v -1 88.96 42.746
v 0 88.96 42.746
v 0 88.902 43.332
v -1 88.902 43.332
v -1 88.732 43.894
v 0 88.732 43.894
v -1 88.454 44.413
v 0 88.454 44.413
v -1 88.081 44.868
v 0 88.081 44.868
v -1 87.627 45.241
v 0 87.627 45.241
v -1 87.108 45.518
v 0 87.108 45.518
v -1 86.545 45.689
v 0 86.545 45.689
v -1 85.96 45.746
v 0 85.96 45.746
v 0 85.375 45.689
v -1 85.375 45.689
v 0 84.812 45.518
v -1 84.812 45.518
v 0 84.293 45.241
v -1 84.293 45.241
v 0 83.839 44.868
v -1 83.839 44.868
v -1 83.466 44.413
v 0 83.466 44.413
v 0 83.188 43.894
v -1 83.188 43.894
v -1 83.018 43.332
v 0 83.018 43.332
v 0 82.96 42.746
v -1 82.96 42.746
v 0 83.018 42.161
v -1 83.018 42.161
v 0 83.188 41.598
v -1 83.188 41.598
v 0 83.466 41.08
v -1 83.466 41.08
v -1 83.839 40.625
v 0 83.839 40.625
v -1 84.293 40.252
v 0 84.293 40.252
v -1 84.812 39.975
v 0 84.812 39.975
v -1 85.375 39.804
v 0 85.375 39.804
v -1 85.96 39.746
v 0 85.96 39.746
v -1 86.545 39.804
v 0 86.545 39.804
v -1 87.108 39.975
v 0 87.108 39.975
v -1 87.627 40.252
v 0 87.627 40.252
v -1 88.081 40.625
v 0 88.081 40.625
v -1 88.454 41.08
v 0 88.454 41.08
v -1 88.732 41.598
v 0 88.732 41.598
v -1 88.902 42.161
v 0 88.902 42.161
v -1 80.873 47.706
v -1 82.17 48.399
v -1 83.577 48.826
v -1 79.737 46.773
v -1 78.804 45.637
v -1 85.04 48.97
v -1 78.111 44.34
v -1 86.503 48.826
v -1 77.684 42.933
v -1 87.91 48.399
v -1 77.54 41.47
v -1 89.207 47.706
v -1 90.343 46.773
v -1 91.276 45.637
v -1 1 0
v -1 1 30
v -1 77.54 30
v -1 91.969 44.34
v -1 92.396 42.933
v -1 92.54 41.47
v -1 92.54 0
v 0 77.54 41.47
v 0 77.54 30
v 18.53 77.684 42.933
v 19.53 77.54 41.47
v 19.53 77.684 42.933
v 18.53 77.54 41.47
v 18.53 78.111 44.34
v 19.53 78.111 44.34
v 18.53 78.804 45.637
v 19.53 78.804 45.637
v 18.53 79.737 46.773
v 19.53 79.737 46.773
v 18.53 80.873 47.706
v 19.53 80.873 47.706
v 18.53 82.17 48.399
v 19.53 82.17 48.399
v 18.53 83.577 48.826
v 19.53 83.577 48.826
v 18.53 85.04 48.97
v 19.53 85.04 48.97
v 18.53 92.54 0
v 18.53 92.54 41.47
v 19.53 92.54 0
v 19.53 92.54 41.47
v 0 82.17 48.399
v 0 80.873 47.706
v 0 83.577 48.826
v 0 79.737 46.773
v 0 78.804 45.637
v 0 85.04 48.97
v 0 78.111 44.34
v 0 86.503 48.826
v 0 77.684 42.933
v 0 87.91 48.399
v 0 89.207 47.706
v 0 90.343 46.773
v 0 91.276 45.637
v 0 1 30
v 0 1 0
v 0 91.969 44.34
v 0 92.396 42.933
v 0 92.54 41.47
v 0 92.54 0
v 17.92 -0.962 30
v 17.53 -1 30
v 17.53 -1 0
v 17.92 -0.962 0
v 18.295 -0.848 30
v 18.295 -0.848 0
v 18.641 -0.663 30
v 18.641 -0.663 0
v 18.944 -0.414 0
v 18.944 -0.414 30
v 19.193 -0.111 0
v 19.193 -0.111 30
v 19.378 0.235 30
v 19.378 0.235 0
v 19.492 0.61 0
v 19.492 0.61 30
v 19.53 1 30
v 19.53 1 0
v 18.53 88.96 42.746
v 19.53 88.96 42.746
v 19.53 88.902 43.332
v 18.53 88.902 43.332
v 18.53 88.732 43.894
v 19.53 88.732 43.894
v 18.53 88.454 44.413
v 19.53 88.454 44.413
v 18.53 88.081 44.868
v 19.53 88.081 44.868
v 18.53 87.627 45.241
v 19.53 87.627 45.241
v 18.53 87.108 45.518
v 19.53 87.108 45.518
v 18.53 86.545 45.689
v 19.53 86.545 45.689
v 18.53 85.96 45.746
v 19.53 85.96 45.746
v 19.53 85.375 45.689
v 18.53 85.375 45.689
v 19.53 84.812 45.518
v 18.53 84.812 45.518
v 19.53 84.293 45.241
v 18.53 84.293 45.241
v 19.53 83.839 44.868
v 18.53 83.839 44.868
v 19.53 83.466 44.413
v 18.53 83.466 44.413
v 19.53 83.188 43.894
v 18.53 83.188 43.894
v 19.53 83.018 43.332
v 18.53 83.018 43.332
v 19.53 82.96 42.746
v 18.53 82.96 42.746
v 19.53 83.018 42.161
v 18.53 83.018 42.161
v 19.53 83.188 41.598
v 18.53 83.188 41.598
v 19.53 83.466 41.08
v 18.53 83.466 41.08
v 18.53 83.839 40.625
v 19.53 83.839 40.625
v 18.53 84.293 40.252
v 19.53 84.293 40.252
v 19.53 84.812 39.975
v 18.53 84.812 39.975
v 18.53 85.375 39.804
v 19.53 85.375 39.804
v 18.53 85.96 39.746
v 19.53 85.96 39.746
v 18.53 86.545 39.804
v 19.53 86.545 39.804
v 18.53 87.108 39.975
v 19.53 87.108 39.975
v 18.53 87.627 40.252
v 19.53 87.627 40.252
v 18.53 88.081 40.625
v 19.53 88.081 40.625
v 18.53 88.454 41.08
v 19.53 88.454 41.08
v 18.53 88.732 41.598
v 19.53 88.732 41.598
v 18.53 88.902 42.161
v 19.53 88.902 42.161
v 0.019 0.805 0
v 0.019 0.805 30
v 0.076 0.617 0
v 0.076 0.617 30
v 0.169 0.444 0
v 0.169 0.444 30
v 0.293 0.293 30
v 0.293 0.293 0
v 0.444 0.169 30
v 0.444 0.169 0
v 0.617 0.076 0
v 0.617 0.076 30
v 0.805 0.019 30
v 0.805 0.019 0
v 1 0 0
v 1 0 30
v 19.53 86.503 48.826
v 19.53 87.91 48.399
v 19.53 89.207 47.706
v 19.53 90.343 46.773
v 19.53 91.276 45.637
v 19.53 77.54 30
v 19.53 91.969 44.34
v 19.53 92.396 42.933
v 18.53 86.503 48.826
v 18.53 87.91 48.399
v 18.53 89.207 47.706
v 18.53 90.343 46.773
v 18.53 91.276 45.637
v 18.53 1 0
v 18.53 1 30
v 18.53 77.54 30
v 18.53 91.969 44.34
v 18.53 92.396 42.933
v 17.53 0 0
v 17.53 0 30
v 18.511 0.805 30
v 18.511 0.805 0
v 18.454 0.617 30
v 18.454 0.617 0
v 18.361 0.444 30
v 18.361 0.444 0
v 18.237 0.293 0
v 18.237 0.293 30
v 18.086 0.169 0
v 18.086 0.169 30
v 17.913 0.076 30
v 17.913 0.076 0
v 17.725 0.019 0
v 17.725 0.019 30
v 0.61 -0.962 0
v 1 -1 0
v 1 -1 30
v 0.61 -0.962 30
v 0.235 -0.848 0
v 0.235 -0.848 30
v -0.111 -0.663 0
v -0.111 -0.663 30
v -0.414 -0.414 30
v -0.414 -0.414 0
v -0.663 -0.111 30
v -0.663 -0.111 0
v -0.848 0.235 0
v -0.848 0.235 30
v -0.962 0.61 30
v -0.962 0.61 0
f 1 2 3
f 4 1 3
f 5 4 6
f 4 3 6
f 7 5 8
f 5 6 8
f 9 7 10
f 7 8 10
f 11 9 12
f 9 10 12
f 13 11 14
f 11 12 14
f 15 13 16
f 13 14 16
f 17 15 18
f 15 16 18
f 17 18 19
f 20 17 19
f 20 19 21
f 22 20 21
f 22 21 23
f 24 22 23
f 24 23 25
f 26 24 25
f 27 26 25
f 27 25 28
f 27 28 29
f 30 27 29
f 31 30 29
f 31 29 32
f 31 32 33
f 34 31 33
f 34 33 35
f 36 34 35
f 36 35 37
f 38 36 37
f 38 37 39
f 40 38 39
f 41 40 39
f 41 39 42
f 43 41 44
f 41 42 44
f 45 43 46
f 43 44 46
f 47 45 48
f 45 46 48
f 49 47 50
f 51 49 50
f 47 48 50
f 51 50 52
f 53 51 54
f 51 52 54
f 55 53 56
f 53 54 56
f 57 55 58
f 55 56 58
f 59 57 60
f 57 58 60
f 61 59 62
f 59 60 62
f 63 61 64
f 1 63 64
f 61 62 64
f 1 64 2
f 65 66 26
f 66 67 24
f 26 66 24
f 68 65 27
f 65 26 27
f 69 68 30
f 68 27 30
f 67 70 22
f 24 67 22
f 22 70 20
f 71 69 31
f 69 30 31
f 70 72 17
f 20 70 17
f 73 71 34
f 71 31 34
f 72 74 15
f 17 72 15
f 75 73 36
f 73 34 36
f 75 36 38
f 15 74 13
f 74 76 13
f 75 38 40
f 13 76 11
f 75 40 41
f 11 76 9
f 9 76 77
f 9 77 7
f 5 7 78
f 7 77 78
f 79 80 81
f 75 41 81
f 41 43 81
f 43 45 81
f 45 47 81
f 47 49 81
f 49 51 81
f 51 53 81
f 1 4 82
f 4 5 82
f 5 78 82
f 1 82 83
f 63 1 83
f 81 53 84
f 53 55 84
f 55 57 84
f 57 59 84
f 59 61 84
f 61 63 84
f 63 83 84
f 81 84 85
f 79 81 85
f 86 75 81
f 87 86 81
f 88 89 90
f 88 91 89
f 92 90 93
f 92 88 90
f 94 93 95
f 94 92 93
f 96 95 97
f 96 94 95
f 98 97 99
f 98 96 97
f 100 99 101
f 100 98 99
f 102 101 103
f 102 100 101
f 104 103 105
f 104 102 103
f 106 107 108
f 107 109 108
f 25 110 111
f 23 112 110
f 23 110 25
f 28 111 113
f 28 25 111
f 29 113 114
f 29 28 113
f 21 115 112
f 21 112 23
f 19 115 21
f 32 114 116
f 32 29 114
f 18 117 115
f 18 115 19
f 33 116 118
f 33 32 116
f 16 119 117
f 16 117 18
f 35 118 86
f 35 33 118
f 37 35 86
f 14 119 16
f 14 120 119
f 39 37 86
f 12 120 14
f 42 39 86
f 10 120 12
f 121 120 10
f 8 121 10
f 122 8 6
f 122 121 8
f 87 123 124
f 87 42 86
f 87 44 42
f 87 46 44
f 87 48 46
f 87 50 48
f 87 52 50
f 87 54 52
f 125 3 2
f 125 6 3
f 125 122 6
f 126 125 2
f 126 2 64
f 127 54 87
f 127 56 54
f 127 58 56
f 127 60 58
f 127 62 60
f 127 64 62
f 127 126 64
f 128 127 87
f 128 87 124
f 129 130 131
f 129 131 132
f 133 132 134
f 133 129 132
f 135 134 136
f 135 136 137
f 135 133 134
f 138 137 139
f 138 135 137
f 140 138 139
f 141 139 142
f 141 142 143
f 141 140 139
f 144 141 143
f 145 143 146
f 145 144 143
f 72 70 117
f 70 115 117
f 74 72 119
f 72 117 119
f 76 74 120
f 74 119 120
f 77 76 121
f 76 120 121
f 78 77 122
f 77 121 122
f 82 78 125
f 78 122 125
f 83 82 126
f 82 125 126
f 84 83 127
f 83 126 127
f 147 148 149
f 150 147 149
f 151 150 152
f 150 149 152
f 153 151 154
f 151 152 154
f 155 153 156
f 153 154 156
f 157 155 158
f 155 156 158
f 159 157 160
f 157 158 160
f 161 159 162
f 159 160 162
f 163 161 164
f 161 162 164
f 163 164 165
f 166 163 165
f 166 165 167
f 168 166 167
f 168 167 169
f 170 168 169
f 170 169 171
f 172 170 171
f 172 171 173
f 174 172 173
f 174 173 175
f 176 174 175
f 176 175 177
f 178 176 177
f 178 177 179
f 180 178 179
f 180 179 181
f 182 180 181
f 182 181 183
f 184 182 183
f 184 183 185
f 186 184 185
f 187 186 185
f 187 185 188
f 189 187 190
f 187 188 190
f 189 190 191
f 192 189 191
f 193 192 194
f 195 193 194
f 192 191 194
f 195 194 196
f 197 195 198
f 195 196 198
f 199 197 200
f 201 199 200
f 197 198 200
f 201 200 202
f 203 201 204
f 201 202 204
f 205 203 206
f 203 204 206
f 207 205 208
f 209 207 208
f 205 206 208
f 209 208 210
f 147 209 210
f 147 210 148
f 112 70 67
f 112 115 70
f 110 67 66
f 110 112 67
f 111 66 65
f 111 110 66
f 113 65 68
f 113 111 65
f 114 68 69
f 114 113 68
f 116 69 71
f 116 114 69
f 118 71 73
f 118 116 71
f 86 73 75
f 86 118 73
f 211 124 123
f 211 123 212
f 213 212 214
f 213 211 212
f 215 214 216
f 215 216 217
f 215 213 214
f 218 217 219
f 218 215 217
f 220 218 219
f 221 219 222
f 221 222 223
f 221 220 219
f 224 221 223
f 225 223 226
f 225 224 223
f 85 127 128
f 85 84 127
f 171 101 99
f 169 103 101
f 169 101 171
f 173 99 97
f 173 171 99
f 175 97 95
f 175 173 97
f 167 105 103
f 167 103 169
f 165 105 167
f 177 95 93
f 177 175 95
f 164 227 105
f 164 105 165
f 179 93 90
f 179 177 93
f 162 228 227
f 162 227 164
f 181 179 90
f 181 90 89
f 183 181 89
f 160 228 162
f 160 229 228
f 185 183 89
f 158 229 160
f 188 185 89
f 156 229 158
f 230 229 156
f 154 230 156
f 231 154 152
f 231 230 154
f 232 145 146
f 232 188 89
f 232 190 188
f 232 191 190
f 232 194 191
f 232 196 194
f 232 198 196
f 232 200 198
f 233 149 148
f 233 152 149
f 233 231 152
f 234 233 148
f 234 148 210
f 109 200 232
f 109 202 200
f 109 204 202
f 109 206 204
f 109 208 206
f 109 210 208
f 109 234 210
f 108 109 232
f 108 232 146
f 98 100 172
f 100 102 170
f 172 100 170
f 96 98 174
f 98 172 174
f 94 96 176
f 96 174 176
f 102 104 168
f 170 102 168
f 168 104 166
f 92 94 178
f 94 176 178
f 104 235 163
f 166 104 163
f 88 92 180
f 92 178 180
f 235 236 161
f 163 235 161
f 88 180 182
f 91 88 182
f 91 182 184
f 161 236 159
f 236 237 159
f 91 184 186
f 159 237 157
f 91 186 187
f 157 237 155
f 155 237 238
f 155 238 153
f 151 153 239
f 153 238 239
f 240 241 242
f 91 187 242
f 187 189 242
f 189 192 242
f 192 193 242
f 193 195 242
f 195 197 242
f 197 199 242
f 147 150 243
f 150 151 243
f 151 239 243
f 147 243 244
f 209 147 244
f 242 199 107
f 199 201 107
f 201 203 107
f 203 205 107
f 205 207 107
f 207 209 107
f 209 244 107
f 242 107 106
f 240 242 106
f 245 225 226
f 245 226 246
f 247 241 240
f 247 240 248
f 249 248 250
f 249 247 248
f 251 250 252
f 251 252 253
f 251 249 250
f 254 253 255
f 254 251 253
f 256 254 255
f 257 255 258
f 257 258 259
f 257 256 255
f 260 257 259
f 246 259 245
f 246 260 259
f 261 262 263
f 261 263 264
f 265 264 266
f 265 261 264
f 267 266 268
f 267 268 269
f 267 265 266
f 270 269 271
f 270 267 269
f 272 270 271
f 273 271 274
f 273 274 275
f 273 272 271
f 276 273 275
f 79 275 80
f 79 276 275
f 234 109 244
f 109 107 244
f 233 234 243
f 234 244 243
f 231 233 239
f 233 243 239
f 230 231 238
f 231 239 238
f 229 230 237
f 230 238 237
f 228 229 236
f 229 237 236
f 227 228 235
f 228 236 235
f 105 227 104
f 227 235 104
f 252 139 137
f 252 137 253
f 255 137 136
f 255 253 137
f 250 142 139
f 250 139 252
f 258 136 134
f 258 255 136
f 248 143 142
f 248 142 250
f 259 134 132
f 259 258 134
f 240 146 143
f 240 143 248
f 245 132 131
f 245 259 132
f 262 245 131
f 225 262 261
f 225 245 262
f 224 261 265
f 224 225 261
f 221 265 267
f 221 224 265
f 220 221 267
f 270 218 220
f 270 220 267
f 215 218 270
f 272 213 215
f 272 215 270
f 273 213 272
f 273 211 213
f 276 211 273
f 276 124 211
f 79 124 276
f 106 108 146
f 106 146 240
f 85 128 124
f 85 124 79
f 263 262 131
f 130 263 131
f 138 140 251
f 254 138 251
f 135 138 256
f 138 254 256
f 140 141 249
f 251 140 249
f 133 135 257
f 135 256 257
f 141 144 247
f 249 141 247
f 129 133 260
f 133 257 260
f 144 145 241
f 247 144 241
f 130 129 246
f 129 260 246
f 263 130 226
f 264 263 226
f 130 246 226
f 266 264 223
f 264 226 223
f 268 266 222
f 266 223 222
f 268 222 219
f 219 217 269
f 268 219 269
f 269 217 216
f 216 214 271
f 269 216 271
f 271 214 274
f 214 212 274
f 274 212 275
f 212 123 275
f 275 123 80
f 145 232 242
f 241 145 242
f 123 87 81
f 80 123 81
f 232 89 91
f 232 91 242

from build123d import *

# Parameters (mm, degrees)
SKETCH1_W                      = 18.53
SKETCH1_H                      = 1
BASE_FLANGE1_DEPTH             = 30
EDGE_FLANGE1_STRIP_W           = 6
EDGE_FLANGE1_STRIP_H           = 1
EDGE_FLANGE1_STRIP_CUT_DEPTH   = 30
EDGE_FLANGE1_STRIP_2_W         = 6
EDGE_FLANGE1_STRIP_2_H         = 1
EDGE_FLANGE1_STRIP_CUT_2_DEPTH = 30
EDGE_FLANGE1_DEPTH             = 30
EDGE_FLANGE1_BEND_DEPTH        = 30
SKETCH17_W                     = 18.97
SKETCH17_H                     = 15
TAB1_DEPTH                     = 1
SKETCH24_R                     = 3
CUT_EXTRUDE1_DEPTH             = 107.692049376
FILLET1_R                      = 7.5


# Sheet-metal steps are written as plain solids
with BuildPart() as part:
    # Sketch1 → Base-Flange1 (new body)
    with BuildSketch(Plane.XY):
        with Locations((9.265, -0.5)):
            Rectangle(SKETCH1_W, SKETCH1_H)
    extrude(amount=BASE_FLANGE1_DEPTH)

    # Edge-Flange1 strip (across the edge) → Edge-Flange1 strip cut (cut)
    with BuildSketch(Plane(origin=(18.53, 0, 30), x_dir=(-1, 0, 0), z_dir=(0, 0, -1))):
        with Locations((-2, -0.5)):
            Rectangle(EDGE_FLANGE1_STRIP_W, EDGE_FLANGE1_STRIP_H)
    extrude(amount=EDGE_FLANGE1_STRIP_CUT_DEPTH, mode=Mode.SUBTRACT)

    # Edge-Flange1 strip 2 (across the edge) → Edge-Flange1 strip cut 2 (cut)
    with BuildSketch(Plane.XY):
        with Locations((-2, -0.5)):
            Rectangle(EDGE_FLANGE1_STRIP_2_W, EDGE_FLANGE1_STRIP_2_H)
    extrude(amount=EDGE_FLANGE1_STRIP_CUT_2_DEPTH, mode=Mode.SUBTRACT)

    # Edge-Flange1 section (across the edge) → Edge-Flange1 (add)
    with BuildSketch(Plane(origin=(18.53, 0, 30), x_dir=(-1, 0, 0), z_dir=(0, 0, -1))):
        with BuildLine():
            Line((-1, 1), (-1, 92.54))
            Line((-1, 92.54), (0, 92.54))
            Line((0, 92.54), (0, 1))
            ThreePointArc((0, 1), (0.292893219, 0.292893219), (1, 0))
            Line((1, 0), (1, -1))
            ThreePointArc((1, -1), (-0.414213562, -0.414213562), (-1, 1))
        make_face()
    extrude(amount=EDGE_FLANGE1_DEPTH)

    # Edge-Flange1 section 2 (across the edge) → Edge-Flange1 bend (add)
    with BuildSketch(Plane.XY):
        with BuildLine():
            Line((-1, 1), (-1, 92.54))
            Line((-1, 92.54), (0, 92.54))
            Line((0, 92.54), (0, 1))
            ThreePointArc((0, 1), (0.292893219, 0.292893219), (1, 0))
            Line((1, 0), (1, -1))
            ThreePointArc((1, -1), (-0.414213562, -0.414213562), (-1, 1))
        make_face()
    extrude(amount=EDGE_FLANGE1_BEND_DEPTH)

    # Sketch17 → Tab1 (add)
    with BuildSketch(Plane(origin=(19.53, 0, 0), x_dir=(0, 0, -1), z_dir=(1, 0, 0))):
        with Locations((-39.485, 85.04)):
            Rectangle(SKETCH17_W, SKETCH17_H)
    tab1 = extrude(amount=-TAB1_DEPTH)

    # Mirror1: Tab1 across plane
    add(tab1.mirror(Plane(origin=(9.265, 0, 0), x_dir=(0, 0, 1), z_dir=(1, 0, 0))))

    # Sketch24 → Cut-Extrude1 (cut, through all)
    with BuildSketch(Plane(origin=(19.53, 0, 0), x_dir=(0, 0, -1), z_dir=(1, 0, 0))):
        with Locations(Location((-42.746376896, 85.96, 0), (0, 0, 90))):
            Circle(SKETCH24_R)
    extrude(amount=-CUT_EXTRUDE1_DEPTH, mode=Mode.SUBTRACT)

    # Fillet1
    fillet1_edges = [part.edges().sort_by_distance(p)[0] for p in [
        (19.03, 77.54, 48.97),
        (-0.5, 77.54, 48.97),
        (-0.5, 92.54, 48.97),
        (19.03, 92.54, 48.97),
    ]]
    fillet(fillet1_edges, radius=FILLET1_R - 0.0001)  # a hair under: the kernel refuses the full size


solid = part.part
